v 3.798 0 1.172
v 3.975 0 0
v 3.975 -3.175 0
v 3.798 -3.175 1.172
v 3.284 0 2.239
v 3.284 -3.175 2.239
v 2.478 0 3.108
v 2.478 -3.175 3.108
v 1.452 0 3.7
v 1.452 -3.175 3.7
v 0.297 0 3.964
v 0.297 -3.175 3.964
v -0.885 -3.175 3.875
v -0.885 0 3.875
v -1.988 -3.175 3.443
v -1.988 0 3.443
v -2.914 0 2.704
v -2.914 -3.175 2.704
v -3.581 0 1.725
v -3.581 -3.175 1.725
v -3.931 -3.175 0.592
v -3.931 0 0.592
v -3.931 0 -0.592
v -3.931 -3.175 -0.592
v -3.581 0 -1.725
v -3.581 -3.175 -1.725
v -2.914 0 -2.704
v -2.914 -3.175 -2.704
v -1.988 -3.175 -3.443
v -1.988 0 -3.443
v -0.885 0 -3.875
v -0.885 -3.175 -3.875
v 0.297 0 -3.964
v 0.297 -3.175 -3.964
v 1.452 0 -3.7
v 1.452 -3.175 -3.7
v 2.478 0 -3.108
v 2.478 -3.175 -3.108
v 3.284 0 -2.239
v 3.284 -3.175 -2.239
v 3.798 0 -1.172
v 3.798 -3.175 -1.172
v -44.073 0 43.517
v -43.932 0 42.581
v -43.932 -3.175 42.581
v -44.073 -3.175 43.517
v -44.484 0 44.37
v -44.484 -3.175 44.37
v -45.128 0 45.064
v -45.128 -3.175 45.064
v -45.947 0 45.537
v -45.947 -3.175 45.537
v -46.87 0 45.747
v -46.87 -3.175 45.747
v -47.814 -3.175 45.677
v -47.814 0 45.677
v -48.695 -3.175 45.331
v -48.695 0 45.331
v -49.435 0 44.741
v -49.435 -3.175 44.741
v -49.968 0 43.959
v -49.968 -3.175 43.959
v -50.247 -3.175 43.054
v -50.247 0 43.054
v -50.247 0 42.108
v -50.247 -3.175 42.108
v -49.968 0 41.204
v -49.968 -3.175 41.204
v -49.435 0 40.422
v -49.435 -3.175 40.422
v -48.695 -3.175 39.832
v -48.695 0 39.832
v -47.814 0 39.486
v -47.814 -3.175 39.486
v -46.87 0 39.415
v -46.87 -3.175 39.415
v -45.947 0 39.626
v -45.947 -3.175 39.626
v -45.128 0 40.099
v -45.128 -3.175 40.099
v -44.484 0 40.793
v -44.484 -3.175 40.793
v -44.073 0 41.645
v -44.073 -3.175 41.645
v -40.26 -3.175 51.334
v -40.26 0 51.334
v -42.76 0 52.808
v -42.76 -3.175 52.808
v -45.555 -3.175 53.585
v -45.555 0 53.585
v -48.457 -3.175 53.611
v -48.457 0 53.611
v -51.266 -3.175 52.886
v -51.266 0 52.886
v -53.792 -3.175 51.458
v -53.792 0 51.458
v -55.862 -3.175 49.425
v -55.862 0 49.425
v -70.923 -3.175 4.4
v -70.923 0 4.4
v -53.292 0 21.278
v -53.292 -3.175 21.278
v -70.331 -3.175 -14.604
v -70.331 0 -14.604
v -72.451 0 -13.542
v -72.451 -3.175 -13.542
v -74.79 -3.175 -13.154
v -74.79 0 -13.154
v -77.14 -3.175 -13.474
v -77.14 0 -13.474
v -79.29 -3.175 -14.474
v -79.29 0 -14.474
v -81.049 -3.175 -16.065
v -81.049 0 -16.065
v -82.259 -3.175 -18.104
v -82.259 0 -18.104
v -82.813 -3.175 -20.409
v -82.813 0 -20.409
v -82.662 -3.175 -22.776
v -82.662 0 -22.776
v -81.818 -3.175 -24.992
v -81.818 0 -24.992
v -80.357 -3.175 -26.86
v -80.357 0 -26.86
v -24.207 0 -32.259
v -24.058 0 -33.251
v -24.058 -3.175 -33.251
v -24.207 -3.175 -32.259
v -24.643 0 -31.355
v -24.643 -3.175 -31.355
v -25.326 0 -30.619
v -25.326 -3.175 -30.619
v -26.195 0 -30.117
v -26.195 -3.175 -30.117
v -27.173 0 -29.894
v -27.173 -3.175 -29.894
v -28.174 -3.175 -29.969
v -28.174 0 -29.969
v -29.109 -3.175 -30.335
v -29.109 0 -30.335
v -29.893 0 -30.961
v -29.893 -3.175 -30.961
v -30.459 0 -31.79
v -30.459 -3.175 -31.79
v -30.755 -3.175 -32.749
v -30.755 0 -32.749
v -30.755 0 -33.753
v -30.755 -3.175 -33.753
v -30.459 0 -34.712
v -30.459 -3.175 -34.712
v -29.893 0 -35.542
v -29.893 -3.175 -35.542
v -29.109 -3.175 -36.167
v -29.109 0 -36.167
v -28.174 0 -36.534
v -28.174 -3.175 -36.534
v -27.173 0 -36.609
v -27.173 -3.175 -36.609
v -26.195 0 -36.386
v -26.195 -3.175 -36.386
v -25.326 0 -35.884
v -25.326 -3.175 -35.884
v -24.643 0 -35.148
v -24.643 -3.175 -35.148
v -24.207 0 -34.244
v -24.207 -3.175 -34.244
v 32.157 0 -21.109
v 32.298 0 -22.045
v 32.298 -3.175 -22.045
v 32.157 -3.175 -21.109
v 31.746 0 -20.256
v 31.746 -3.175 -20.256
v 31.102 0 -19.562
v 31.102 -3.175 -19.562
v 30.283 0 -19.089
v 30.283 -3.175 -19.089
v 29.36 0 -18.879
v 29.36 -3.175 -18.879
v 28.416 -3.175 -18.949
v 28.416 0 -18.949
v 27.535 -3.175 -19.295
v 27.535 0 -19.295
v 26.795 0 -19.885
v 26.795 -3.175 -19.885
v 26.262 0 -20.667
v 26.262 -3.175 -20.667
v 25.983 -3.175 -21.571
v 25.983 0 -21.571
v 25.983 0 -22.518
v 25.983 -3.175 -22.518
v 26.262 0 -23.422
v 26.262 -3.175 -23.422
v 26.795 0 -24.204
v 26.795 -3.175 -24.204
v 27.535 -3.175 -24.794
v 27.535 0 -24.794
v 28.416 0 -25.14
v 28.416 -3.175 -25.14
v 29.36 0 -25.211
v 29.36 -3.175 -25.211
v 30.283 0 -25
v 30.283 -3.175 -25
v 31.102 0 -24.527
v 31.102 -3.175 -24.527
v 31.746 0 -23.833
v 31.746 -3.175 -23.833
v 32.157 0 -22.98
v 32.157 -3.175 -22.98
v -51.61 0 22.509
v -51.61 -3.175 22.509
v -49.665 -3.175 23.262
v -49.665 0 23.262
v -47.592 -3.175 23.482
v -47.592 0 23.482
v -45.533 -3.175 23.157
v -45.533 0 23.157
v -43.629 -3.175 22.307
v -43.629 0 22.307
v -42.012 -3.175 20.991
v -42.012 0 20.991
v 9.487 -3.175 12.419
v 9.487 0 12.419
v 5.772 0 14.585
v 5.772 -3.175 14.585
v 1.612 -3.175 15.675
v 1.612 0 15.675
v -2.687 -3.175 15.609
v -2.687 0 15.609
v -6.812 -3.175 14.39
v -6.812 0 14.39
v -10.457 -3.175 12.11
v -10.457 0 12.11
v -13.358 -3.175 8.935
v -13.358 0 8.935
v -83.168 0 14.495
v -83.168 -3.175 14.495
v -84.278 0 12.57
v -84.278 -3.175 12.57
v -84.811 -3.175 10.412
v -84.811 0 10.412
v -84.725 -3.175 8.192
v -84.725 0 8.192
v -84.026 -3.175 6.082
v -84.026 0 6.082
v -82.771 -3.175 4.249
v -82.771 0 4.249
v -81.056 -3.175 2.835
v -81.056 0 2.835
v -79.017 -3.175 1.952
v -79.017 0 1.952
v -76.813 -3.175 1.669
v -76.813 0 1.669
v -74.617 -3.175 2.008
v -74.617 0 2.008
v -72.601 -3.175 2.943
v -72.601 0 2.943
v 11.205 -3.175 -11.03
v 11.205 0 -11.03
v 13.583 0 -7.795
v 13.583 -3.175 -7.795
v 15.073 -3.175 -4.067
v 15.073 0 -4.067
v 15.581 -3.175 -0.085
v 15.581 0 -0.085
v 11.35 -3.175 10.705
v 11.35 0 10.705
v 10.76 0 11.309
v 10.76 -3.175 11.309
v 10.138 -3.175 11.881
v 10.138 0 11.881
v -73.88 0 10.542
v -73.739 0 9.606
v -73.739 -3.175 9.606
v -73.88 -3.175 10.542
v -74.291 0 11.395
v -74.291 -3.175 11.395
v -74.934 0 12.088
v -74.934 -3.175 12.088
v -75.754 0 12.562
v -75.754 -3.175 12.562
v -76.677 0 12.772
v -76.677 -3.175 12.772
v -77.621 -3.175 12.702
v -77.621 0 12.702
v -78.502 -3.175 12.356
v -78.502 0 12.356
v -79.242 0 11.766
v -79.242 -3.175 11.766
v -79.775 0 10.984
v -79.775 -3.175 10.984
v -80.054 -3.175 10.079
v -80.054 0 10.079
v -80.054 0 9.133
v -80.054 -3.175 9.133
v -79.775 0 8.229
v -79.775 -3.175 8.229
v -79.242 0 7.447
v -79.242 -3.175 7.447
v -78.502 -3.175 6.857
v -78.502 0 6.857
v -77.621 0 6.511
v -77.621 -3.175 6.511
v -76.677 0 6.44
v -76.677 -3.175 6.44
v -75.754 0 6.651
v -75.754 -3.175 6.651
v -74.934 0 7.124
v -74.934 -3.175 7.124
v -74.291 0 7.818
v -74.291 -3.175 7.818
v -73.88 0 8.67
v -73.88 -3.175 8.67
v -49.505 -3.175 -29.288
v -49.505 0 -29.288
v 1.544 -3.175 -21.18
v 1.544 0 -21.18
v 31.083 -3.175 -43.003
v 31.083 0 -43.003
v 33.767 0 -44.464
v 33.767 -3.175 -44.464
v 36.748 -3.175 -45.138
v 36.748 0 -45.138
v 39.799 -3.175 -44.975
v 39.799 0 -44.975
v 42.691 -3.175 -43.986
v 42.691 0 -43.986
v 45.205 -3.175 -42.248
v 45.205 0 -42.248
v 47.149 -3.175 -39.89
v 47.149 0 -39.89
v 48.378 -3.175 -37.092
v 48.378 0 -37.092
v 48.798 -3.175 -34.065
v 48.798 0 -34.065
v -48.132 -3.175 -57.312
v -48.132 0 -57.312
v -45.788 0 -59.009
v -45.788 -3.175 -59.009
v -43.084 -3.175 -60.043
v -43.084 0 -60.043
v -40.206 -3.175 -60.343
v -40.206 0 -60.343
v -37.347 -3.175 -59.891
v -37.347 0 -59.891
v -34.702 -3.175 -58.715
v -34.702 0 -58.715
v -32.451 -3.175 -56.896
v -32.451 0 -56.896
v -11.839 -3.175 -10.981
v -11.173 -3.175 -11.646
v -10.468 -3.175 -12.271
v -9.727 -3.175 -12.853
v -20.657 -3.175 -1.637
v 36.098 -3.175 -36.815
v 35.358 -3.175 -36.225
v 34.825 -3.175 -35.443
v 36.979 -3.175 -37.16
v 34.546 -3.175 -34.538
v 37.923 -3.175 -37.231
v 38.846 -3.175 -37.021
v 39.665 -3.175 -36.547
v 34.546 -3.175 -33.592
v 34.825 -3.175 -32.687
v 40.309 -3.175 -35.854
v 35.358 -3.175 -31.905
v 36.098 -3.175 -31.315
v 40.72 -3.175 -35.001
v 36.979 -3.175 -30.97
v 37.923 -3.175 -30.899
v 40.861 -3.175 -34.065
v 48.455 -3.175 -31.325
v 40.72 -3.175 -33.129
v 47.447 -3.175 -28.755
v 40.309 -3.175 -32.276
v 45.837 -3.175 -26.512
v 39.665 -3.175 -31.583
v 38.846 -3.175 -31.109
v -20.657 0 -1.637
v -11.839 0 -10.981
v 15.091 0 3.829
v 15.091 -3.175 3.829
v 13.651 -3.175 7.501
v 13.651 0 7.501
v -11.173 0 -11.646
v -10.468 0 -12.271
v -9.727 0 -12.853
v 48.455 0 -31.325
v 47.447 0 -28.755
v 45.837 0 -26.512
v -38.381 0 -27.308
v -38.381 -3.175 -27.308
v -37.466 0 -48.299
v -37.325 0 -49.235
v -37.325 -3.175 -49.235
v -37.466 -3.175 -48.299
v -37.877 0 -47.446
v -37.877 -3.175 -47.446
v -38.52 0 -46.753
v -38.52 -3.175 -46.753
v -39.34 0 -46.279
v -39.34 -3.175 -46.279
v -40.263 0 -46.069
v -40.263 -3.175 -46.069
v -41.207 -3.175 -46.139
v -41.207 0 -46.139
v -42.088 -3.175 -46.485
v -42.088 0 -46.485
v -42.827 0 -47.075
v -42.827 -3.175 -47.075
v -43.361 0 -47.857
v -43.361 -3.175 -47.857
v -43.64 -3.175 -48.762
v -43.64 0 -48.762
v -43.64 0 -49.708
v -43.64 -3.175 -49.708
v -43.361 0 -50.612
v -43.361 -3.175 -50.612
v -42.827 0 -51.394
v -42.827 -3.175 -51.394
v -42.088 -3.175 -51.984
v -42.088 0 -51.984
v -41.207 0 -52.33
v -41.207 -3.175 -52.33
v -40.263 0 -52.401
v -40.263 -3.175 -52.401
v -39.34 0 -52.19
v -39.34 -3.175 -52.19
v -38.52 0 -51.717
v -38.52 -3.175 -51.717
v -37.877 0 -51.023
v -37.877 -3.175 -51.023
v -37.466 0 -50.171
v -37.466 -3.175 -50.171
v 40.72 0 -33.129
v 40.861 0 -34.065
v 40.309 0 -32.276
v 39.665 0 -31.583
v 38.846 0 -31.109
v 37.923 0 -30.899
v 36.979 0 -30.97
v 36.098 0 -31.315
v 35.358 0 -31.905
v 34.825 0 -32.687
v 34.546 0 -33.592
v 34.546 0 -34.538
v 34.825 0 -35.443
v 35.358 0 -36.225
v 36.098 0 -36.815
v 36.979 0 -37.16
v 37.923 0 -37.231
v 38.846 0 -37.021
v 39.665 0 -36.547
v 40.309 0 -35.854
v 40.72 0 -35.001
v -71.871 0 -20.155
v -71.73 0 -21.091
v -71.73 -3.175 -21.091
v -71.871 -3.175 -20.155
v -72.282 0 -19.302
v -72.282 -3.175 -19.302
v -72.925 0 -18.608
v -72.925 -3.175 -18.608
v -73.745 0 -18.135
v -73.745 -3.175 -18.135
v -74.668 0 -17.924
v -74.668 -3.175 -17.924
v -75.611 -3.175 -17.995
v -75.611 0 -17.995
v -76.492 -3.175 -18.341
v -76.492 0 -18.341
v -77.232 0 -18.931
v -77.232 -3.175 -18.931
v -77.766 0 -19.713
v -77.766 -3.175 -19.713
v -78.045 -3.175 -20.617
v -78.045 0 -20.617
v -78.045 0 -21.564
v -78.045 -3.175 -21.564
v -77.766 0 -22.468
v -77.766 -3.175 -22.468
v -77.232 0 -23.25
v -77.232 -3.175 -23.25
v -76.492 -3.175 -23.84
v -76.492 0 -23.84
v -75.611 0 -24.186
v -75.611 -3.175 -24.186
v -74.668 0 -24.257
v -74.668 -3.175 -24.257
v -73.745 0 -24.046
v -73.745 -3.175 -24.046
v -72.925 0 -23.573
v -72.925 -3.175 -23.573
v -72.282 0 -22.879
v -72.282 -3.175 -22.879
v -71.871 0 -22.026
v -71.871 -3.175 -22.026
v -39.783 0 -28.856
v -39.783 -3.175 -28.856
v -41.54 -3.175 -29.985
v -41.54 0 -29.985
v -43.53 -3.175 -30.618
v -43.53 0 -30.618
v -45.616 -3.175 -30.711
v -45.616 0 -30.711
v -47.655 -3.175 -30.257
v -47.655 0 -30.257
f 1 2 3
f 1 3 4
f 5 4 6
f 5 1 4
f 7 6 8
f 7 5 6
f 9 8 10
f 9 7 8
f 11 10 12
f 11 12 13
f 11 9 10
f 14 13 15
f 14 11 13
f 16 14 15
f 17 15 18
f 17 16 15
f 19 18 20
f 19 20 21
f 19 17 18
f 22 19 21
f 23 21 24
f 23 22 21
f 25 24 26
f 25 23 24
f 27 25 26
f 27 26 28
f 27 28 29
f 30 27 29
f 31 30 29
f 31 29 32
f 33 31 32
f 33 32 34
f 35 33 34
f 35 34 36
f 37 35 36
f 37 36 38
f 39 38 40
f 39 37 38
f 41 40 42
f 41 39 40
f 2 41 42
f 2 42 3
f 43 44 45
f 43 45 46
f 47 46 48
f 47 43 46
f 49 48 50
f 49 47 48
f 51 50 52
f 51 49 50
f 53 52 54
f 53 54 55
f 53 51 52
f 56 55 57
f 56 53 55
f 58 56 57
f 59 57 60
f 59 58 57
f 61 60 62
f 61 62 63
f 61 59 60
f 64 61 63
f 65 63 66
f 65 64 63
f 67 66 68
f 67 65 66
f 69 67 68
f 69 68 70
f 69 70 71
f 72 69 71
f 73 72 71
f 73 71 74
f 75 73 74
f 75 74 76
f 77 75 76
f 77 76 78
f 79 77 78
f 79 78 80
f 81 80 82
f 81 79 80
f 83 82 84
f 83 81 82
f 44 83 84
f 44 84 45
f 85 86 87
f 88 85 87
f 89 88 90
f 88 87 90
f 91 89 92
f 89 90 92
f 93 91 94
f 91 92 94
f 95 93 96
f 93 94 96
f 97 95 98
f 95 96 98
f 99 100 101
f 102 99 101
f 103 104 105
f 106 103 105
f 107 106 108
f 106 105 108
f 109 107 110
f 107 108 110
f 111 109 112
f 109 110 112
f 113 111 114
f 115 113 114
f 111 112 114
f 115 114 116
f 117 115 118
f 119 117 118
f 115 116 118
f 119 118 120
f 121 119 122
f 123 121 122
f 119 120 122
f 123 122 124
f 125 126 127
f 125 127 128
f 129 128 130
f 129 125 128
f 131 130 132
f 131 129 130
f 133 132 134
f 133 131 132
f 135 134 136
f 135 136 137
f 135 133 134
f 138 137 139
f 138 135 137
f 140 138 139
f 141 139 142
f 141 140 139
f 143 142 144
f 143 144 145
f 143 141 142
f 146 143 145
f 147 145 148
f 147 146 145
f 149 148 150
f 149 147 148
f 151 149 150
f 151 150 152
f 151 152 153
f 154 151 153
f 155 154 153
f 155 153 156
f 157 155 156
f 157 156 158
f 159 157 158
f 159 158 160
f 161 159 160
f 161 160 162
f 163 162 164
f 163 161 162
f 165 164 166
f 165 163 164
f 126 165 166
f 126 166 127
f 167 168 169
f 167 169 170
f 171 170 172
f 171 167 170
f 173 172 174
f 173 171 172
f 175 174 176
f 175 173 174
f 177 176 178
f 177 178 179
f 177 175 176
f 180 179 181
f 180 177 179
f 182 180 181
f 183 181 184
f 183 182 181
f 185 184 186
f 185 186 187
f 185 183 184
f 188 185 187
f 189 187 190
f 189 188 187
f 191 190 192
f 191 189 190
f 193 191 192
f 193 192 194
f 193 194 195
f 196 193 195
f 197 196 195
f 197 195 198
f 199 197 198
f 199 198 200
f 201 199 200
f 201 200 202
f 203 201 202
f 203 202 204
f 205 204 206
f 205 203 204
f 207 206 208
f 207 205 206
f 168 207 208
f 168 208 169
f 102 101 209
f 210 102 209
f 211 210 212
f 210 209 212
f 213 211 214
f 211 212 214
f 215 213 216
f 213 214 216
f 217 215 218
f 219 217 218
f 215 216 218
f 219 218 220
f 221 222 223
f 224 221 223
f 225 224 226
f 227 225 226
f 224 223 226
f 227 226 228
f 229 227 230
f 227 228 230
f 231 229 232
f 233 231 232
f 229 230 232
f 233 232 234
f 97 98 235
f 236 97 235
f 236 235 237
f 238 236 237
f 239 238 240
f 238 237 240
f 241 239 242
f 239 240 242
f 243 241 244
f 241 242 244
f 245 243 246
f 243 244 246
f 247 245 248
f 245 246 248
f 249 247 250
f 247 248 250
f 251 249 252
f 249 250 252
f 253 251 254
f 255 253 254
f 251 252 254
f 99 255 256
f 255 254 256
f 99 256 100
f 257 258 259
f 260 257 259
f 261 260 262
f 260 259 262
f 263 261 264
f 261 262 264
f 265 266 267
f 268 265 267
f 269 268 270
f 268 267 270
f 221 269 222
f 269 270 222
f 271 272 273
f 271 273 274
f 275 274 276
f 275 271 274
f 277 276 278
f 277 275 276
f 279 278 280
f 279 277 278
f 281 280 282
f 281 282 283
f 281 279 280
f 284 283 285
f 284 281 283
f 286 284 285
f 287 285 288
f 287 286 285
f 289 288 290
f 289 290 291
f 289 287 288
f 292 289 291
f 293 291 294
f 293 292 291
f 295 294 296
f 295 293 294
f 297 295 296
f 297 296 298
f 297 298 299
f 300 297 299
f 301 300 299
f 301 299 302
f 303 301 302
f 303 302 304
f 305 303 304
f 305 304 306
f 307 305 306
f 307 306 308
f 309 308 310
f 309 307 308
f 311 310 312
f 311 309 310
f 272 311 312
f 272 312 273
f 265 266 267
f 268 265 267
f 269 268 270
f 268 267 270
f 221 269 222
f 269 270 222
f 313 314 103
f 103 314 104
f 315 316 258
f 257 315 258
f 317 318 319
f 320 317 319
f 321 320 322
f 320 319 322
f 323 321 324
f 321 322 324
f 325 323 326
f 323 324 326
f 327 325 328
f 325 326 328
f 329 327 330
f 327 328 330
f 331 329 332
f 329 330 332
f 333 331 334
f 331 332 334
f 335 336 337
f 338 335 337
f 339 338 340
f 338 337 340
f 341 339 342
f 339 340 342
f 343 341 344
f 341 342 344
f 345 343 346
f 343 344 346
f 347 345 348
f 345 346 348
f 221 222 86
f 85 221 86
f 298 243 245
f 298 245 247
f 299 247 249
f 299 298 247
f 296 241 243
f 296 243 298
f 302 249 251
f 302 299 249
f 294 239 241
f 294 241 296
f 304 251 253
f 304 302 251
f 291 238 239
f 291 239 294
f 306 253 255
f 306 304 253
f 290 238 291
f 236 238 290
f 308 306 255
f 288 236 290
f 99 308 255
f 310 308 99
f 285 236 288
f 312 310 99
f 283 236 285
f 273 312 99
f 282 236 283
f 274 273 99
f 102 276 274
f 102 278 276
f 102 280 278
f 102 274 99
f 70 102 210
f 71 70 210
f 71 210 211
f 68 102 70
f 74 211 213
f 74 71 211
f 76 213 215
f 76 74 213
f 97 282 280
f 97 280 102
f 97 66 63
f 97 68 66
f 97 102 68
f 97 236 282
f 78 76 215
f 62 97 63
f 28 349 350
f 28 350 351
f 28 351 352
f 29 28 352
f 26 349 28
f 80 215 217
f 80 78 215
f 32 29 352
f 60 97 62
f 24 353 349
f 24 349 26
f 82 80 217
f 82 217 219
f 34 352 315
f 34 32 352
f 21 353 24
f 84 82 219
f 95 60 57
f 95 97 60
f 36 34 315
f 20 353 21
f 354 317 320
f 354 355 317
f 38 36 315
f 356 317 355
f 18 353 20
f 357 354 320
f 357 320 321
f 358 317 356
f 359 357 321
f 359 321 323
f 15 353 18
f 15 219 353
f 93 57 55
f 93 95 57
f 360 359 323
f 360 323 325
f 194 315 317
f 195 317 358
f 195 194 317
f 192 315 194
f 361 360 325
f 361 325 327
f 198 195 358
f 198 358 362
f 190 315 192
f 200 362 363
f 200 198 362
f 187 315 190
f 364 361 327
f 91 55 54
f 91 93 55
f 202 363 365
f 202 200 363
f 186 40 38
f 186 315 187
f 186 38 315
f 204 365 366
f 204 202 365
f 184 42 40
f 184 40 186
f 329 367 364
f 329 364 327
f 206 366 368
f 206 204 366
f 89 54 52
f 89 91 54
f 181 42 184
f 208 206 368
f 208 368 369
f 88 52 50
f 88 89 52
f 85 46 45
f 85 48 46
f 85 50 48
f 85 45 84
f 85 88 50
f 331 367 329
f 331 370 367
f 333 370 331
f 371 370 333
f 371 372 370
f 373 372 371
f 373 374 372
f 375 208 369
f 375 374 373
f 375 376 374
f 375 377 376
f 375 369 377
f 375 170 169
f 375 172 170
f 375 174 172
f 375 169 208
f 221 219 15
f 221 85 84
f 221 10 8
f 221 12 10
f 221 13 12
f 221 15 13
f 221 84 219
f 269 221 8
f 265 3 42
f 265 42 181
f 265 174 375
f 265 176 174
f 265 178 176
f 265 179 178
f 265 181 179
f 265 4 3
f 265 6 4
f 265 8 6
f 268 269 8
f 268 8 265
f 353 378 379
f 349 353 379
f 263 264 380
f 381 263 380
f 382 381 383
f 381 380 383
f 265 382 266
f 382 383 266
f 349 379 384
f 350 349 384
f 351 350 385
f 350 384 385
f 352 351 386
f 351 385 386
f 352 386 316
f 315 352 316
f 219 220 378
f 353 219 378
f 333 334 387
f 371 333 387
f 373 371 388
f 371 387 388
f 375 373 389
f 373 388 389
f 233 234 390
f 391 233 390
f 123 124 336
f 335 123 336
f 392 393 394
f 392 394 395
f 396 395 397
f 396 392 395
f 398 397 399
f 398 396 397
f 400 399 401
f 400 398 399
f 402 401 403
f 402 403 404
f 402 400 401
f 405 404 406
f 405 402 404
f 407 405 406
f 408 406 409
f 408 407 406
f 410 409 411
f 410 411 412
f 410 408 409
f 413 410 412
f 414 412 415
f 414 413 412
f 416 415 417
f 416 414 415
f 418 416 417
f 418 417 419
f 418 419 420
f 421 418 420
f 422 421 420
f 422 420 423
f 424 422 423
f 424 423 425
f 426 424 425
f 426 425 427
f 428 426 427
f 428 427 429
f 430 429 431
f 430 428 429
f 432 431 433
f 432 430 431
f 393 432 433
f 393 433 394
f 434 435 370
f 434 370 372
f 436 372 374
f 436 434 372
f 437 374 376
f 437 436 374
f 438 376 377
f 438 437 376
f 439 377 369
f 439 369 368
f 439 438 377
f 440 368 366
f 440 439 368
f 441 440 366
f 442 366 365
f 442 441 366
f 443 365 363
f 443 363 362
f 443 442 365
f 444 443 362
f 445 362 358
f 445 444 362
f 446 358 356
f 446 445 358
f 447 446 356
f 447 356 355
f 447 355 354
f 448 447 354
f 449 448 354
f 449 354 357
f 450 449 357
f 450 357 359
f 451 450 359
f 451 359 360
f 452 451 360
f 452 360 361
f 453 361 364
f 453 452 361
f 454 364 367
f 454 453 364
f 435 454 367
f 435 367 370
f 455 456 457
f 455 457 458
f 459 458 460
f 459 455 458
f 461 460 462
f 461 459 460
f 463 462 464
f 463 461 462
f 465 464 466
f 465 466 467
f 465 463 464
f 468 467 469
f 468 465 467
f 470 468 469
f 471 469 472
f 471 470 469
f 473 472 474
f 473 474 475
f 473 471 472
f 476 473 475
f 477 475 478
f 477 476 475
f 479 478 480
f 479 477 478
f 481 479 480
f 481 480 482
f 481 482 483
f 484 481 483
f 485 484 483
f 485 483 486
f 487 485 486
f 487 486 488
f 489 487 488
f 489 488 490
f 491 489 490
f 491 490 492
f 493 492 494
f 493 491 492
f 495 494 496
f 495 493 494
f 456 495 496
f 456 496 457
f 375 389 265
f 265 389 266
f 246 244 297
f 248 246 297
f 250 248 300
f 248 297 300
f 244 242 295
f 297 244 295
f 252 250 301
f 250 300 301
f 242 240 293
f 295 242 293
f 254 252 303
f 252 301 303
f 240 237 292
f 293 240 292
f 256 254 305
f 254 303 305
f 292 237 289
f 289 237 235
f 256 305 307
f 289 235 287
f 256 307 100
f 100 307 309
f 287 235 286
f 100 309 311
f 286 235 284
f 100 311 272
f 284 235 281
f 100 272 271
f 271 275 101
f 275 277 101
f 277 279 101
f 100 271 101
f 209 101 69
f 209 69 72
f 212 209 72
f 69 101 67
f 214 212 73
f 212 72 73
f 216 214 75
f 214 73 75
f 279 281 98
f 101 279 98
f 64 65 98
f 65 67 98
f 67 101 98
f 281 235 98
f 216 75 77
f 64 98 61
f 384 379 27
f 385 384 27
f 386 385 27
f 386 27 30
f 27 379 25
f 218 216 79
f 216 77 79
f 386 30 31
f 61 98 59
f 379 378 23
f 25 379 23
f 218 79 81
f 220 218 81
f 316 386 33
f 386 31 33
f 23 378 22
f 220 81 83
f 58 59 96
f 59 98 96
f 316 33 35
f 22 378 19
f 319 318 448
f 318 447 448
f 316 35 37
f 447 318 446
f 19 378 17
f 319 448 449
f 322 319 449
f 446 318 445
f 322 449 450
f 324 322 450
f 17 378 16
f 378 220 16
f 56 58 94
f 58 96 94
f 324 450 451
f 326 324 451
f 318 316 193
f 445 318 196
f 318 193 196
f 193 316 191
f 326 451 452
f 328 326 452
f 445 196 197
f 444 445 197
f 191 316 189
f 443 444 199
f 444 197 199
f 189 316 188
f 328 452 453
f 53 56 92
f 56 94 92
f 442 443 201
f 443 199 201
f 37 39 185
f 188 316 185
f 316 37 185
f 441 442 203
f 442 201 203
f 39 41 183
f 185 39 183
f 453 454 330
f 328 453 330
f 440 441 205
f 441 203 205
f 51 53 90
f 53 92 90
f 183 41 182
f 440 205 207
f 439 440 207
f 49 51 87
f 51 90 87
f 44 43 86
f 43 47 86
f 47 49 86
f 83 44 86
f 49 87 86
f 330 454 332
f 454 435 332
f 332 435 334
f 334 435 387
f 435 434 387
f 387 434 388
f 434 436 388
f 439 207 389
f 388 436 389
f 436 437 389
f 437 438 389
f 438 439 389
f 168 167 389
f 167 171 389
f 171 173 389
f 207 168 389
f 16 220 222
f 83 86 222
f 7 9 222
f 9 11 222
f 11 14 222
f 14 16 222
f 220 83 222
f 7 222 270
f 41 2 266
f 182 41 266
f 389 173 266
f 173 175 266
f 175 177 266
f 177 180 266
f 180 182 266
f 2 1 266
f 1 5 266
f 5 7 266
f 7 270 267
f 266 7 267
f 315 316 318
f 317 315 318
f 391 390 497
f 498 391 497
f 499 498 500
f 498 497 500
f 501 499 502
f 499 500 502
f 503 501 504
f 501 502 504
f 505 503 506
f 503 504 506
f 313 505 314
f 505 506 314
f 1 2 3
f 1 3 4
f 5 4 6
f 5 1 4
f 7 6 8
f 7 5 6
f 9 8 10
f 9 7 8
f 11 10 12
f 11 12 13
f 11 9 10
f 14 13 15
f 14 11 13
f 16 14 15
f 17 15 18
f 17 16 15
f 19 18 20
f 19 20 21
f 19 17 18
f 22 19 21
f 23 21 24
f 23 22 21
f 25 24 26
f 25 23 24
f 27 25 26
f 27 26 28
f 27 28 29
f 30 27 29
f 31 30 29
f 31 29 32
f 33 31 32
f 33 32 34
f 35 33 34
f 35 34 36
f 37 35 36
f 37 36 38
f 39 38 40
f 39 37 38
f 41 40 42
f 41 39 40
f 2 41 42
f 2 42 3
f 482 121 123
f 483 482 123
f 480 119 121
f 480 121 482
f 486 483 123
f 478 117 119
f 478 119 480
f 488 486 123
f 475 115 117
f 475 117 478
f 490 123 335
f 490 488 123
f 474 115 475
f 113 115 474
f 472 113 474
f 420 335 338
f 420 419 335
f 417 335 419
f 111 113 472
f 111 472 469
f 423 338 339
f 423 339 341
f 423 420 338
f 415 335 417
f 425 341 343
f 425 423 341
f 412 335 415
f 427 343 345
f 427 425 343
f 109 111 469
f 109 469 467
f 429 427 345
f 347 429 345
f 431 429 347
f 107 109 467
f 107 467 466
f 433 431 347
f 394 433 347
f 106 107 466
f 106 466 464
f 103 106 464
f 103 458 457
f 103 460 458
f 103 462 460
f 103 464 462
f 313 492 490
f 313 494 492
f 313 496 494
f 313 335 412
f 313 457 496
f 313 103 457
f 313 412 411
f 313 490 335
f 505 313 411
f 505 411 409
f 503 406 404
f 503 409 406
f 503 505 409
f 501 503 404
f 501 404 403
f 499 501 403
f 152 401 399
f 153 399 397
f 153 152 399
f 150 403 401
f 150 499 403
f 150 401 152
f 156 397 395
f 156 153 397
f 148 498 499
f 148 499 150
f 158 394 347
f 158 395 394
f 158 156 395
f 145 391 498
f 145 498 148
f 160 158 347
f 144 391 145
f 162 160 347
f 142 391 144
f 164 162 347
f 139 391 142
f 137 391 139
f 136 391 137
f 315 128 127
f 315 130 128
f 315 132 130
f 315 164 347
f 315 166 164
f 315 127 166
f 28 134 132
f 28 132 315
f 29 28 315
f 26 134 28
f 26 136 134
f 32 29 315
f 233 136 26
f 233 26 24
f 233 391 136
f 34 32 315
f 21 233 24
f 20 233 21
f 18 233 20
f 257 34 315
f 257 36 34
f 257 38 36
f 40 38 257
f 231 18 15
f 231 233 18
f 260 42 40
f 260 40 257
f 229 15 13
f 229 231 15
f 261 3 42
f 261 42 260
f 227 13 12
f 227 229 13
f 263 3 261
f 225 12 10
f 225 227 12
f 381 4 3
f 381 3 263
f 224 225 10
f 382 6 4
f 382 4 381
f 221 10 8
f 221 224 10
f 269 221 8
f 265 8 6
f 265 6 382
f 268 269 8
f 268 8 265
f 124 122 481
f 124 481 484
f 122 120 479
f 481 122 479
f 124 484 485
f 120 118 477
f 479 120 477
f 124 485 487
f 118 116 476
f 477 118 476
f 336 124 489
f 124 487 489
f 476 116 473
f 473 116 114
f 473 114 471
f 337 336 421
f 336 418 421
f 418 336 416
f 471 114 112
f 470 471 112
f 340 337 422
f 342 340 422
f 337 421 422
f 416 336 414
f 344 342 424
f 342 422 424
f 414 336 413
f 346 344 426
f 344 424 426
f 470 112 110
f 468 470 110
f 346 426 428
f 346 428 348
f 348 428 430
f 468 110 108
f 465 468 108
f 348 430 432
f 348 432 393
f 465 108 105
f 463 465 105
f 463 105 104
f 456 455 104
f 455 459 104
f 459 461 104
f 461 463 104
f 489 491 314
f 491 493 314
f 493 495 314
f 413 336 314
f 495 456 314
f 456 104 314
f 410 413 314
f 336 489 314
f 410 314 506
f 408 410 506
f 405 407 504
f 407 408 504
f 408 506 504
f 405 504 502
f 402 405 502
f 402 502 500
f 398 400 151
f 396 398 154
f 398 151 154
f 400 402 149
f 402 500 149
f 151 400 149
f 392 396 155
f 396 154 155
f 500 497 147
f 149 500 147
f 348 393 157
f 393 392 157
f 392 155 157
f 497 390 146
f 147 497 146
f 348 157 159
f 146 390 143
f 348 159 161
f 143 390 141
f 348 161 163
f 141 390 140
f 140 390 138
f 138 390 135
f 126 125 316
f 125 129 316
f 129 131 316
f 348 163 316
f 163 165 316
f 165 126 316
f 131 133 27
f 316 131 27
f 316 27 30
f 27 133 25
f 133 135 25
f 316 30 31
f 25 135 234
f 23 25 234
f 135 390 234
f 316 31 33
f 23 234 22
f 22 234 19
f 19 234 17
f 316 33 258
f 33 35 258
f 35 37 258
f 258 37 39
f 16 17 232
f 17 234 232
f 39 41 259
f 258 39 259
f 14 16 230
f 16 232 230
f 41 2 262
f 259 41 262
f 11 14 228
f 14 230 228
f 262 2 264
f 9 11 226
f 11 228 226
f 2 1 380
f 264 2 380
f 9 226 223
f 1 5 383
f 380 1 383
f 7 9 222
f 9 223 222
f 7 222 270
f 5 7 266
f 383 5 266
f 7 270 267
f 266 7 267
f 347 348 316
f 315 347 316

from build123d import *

# Parameters (mm, degrees)
F0_R     = 3.175
F0_R_2   = 3.9751
F1_DEPTH = 3.175
F0_R_3   = 3.3671288516
F2_DEPTH = 3.175


with BuildPart() as f1:
    # F0 (on Front) → F1 (new body)
    with BuildSketch(Plane.XZ):
        with BuildLine():
            ThreePointArc((31.0825885651, -43.002858055), (42.6912565073, -43.9863076148), (48.7982686301, -34.0649797117))
            ThreePointArc((48.7982686301, -34.0649797117), (48.0314533665, -30.0085695272), (45.8368353639, -26.5119824689))
            ThreePointArc((45.8368353639, -26.5119824689), (29.404088083, -26.655430227), (31.0825885651, -43.002858055))
        make_face()
        with Locations((37.6857686301, -34.0649797117)):
            Circle(F0_R, mode=Mode.SUBTRACT)
        with BuildLine():
            ThreePointArc((-35.9947107876, 42.5812246396), (-37.1179082007, 47.4496422549), (-40.2604457845, 51.3339079563))
            ThreePointArc((-40.2604457845, 51.3339079563), (-48.4567411463, 53.6114750475), (-55.862181086, 49.4250650326))
            ThreePointArc((-55.862181086, 49.4250650326), (-58.2077082838, 42.0648801936), (-55.1890631006, 34.9542121549))
            ThreePointArc((-55.1890631006, 34.9542121549), (-43.003671314, 32.2541427653), (-35.9947107876, 42.5812246396))
        make_face()
        with Locations((-47.1072107876, 42.5812246396)):
            Circle(F0_R, mode=Mode.SUBTRACT)
        with BuildLine():
            ThreePointArc((-68.9765680354, 9.6061770883), (-74.3288841509, 17.1108909758), (-83.1676182485, 14.4946345119))
            ThreePointArc((-83.1676182485, 14.4946345119), (-81.9631953605, 3.4816183691), (-70.9226276925, 4.399782091))
            ThreePointArc((-70.9226276925, 4.399782091), (-69.4789835042, 6.8270721489), (-68.9765680354, 9.6061770883))
        make_face()
        with Locations((-76.9140680354, 9.6061770883)):
            Circle(F0_R, mode=Mode.SUBTRACT)
        with BuildLine():
            ThreePointArc((31.0825885651, -43.002858055), (29.404088083, -26.655430227), (45.8368353639, -26.5119824689))
            Line((45.8368353639, -26.5119824689), (11.3504961121, 10.7050909141))
            ThreePointArc((11.3504961121, 10.7050909141), (14.4856646871, 5.7099665451), (15.5811150637, -0.0849051471))
            ThreePointArc((15.5811150637, -0.0849051471), (14.446577477, -5.9784942778), (11.205128564, -11.0296899106))
            Line((11.205128564, -11.0296899106), (1.5439354587, -21.1801124495))
            Line((1.5439354587, -21.1801124495), (31.0825885651, -43.002858055))
        make_face()
        with Locations((29.1225633863, -22.0446487124)):
            Circle(F0_R, mode=Mode.SUBTRACT)
        with BuildLine():
            ThreePointArc((-13.3575889812, 8.9348100162), (-2.6873455814, 15.6086276337), (9.4872079254, 12.4189281624))
            Line((9.4872079254, 12.4189281624), (-40.2604457845, 51.3339079563))
            ThreePointArc((-40.2604457845, 51.3339079563), (-37.1179082007, 47.4496422549), (-35.9947107876, 42.5812246396))
            ThreePointArc((-35.9947107876, 42.5812246396), (-43.003671314, 32.2541427653), (-55.1890631006, 34.9542121549))
            ThreePointArc((-55.1890631006, 34.9542121549), (-58.2077082838, 42.0648801936), (-55.862181086, 49.4250650326))
            Line((-55.862181086, 49.4250650326), (-83.1676182485, 14.4946345119))
            ThreePointArc((-83.1676182485, 14.4946345119), (-74.3288841509, 17.1108909758), (-68.9765680354, 9.6061770883))
            ThreePointArc((-68.9765680354, 9.6061770883), (-69.4789835042, 6.8270721489), (-70.9226276925, 4.399782091))
            Line((-70.9226276925, 4.399782091), (-53.2915543506, 21.2776510093))
            ThreePointArc((-53.2915543506, 21.2776510093), (-47.5921325377, 23.4823172204), (-42.0119352332, 20.9912611901))
            Line((-42.0119352332, 20.9912611901), (-20.6569570309, -1.6372293654))
            Line((-20.6569570309, -1.6372293654), (-13.3575889812, 8.9348100162))
        make_face()
        with BuildLine():
            ThreePointArc((15.5811150637, -0.0849051471), (14.4856646871, 5.7099665451), (11.3504961121, 10.7050909141))
            ThreePointArc((11.3504961121, 10.7050909141), (10.453070102, 11.5992115249), (9.4872079254, 12.4189281624))
            ThreePointArc((9.4872079254, 12.4189281624), (-2.6873455814, 15.6086276337), (-13.3575889812, 8.9348100162))
            ThreePointArc((-13.3575889812, 8.9348100162), (-16.1229572945, -1.2915920488), (-11.8393882405, -10.9806372681))
            ThreePointArc((-11.8393882405, -10.9806372681), (-10.8249019337, -11.9640173193), (-9.7269993148, -12.8533027803))
            ThreePointArc((-9.7269993148, -12.8533027803), (1.0839306428, -15.9000007595), (11.205128564, -11.0296899106))
            ThreePointArc((11.205128564, -11.0296899106), (14.446577477, -5.9784942778), (15.5811150637, -0.0849051471))
        make_face()
        Circle(F0_R_2, mode=Mode.SUBTRACT)
        with BuildLine():
            ThreePointArc((-11.8393882405, -10.9806372681), (-16.1229572945, -1.2915920488), (-13.3575889812, 8.9348100162))
            Line((-13.3575889812, 8.9348100162), (-20.6569570309, -1.6372293654))
            Line((-20.6569570309, -1.6372293654), (-11.8393882405, -10.9806372681))
        make_face()
        with BuildLine():
            Line((-9.7269993148, -12.8533027803), (1.5439354587, -21.1801124495))
            Line((1.5439354587, -21.1801124495), (11.205128564, -11.0296899106))
            ThreePointArc((11.205128564, -11.0296899106), (1.0839306428, -15.9000007595), (-9.7269993148, -12.8533027803))
        make_face()
    extrude(amount=F1_DEPTH)


with BuildPart() as f2:
    # F0 (on Front) → F2 (new body)
    with BuildSketch(Plane.XZ):
        with BuildLine():
            Line((-32.4507080231, -56.8961975784), (1.5439354587, -21.1801124495))
            Line((1.5439354587, -21.1801124495), (-9.7269993148, -12.8533027803))
            ThreePointArc((-9.7269993148, -12.8533027803), (-10.8249019337, -11.9640173193), (-11.8393882405, -10.9806372681))
            Line((-11.8393882405, -10.9806372681), (-20.6569570309, -1.6372293654))
            Line((-20.6569570309, -1.6372293654), (-38.3810651071, -27.3079404885))
            ThreePointArc((-38.3810651071, -27.3079404885), (-43.5299147943, -30.6179973844), (-49.5047771992, -29.288279746))
            Line((-49.5047771992, -29.288279746), (-70.3308870796, -14.6035221102))
            ThreePointArc((-70.3308870796, -14.6035221102), (-67.8583206293, -17.4369912891), (-66.967477641, -21.090555468))
            ThreePointArc((-66.967477641, -21.090555468), (-71.7640783412, -28.3801821963), (-80.3567457578, -26.8596221734))
            Line((-80.3567457578, -26.8596221734), (-48.1324928367, -57.3115416315))
            ThreePointArc((-48.1324928367, -57.3115416315), (-44.897276493, -39.0293708242), (-29.3875174733, -49.2348482439))
            ThreePointArc((-29.3875174733, -49.2348482439), (-30.1816937839, -53.3603606354), (-32.4507080231, -56.8961975784))
        make_face()
        with Locations((-27.4249831722, -33.2512867488)):
            Circle(F0_R_3, mode=Mode.SUBTRACT)
        with BuildLine():
            ThreePointArc((-48.1324928367, -57.3115416315), (-40.2057975987, -60.3434526079), (-32.4507080231, -56.8961975784))
            ThreePointArc((-32.4507080231, -56.8961975784), (-30.1816937839, -53.3603606354), (-29.3875174733, -49.2348482439))
            ThreePointArc((-29.3875174733, -49.2348482439), (-44.897276493, -39.0293708242), (-48.1324928367, -57.3115416315))
        make_face()
        with Locations((-40.5000174733, -49.2348482439)):
            Circle(F0_R, mode=Mode.SUBTRACT)
        with BuildLine():
            ThreePointArc((-70.3308870796, -14.6035221102), (-81.0487205281, -16.0647889009), (-80.3567457578, -26.8596221734))
            ThreePointArc((-80.3567457578, -26.8596221734), (-71.7640783412, -28.3801821963), (-66.967477641, -21.090555468))
            ThreePointArc((-66.967477641, -21.090555468), (-67.8583206293, -17.4369912891), (-70.3308870796, -14.6035221102))
        make_face()
        with Locations((-74.904977641, -21.090555468)):
            Circle(F0_R, mode=Mode.SUBTRACT)
        with BuildLine():
            ThreePointArc((15.5811150637, -0.0849051471), (14.4856646871, 5.7099665451), (11.3504961121, 10.7050909141))
            ThreePointArc((11.3504961121, 10.7050909141), (10.453070102, 11.5992115249), (9.4872079254, 12.4189281624))
            ThreePointArc((9.4872079254, 12.4189281624), (-2.6873455814, 15.6086276337), (-13.3575889812, 8.9348100162))
            ThreePointArc((-13.3575889812, 8.9348100162), (-16.1229572945, -1.2915920488), (-11.8393882405, -10.9806372681))
            ThreePointArc((-11.8393882405, -10.9806372681), (-10.8249019337, -11.9640173193), (-9.7269993148, -12.8533027803))
            ThreePointArc((-9.7269993148, -12.8533027803), (1.0839306428, -15.9000007595), (11.205128564, -11.0296899106))
            ThreePointArc((11.205128564, -11.0296899106), (14.446577477, -5.9784942778), (15.5811150637, -0.0849051471))
        make_face()
        Circle(F0_R_2, mode=Mode.SUBTRACT)
        with BuildLine():
            ThreePointArc((-11.8393882405, -10.9806372681), (-16.1229572945, -1.2915920488), (-13.3575889812, 8.9348100162))
            Line((-13.3575889812, 8.9348100162), (-20.6569570309, -1.6372293654))
            Line((-20.6569570309, -1.6372293654), (-11.8393882405, -10.9806372681))
        make_face()
        with BuildLine():
            Line((-9.7269993148, -12.8533027803), (1.5439354587, -21.1801124495))
            Line((1.5439354587, -21.1801124495), (11.205128564, -11.0296899106))
            ThreePointArc((11.205128564, -11.0296899106), (1.0839306428, -15.9000007595), (-9.7269993148, -12.8533027803))
        make_face()
    extrude(amount=F2_DEPTH)


solid = Compound([f1.part, f2.part])
